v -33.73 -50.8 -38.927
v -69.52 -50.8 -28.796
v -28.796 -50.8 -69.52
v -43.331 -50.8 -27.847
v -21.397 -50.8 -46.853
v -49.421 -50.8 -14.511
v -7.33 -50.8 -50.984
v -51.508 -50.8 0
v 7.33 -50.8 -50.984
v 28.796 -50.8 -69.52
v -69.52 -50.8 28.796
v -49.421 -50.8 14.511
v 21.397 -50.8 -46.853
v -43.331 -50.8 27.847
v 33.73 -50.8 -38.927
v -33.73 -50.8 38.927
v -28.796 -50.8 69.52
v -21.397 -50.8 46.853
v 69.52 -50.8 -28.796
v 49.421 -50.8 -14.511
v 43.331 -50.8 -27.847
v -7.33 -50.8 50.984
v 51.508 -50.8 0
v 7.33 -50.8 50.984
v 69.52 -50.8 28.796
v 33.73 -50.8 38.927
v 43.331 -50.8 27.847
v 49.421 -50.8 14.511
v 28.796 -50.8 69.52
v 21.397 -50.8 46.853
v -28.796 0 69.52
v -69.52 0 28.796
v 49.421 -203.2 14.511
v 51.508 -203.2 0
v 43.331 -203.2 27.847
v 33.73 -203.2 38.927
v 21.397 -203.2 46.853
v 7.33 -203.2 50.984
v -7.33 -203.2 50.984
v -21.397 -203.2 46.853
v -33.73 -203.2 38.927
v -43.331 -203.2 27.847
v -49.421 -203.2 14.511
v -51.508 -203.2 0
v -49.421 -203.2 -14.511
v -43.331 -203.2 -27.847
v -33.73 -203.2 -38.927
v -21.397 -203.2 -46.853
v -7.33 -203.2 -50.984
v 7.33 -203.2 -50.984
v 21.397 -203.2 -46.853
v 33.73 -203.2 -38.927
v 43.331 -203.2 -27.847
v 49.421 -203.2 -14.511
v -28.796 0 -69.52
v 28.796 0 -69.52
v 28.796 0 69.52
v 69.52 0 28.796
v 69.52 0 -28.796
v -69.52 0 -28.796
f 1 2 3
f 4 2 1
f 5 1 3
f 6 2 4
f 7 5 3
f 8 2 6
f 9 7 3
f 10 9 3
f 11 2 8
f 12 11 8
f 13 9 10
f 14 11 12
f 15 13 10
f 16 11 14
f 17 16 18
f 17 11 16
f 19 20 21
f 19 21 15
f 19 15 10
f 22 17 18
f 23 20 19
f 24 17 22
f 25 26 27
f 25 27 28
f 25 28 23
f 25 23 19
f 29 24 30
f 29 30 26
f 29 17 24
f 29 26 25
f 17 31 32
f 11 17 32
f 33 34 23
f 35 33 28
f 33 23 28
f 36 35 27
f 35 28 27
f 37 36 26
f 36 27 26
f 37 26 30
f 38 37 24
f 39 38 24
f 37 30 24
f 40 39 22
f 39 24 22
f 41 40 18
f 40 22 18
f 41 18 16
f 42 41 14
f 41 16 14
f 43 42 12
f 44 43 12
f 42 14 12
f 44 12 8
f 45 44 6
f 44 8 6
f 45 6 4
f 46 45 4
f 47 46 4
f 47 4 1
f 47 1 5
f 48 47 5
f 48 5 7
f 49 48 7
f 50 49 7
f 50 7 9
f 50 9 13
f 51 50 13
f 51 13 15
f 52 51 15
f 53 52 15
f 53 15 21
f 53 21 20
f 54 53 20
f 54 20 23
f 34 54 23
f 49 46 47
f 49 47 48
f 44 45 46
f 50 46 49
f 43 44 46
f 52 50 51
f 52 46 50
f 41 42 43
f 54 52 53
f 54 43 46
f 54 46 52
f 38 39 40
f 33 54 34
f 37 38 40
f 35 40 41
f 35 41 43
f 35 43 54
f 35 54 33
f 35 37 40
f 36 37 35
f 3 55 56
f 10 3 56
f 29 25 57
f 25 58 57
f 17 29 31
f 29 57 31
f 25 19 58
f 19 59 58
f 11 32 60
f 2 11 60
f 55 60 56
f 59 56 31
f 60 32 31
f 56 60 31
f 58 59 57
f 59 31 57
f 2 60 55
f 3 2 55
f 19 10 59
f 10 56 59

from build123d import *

# Parameters (mm, degrees)
F1_DEPTH = 25.4
F2_R     = 51.507819
F3_DEPTH = 203.2
F5_DEPTH = 25.4


with BuildPart() as f1:
    # F0 (on Front) → F1 (new body)
    with BuildSketch(Plane.XZ):
        Polygon((-28.796132, -69.520012), (28.796132, -69.520012), (69.520012, -28.796132), (69.520012, 28.796132), (28.796132, 69.520012), (-28.796132, 69.520012), (-69.520012, 28.796132), (-69.520012, -28.796132), align=None)
    extrude(amount=F1_DEPTH)

    # F2 (on Front) → F3 (join)
    with BuildSketch(Plane.XZ):
        Circle(F2_R)
    extrude(amount=F3_DEPTH)

    # F4 (on face) → F5 (join)
    with BuildSketch(Plane.XZ.offset(25.4)):
        Polygon((-28.796132, -69.520012), (28.796132, -69.520012), (69.520012, -28.796132), (69.520012, 28.796132), (28.796132, 69.520012), (-28.796132, 69.520012), (-69.520012, 28.796132), (-69.520012, -28.796132), align=None)
    extrude(amount=F5_DEPTH)


solid = f1.part
